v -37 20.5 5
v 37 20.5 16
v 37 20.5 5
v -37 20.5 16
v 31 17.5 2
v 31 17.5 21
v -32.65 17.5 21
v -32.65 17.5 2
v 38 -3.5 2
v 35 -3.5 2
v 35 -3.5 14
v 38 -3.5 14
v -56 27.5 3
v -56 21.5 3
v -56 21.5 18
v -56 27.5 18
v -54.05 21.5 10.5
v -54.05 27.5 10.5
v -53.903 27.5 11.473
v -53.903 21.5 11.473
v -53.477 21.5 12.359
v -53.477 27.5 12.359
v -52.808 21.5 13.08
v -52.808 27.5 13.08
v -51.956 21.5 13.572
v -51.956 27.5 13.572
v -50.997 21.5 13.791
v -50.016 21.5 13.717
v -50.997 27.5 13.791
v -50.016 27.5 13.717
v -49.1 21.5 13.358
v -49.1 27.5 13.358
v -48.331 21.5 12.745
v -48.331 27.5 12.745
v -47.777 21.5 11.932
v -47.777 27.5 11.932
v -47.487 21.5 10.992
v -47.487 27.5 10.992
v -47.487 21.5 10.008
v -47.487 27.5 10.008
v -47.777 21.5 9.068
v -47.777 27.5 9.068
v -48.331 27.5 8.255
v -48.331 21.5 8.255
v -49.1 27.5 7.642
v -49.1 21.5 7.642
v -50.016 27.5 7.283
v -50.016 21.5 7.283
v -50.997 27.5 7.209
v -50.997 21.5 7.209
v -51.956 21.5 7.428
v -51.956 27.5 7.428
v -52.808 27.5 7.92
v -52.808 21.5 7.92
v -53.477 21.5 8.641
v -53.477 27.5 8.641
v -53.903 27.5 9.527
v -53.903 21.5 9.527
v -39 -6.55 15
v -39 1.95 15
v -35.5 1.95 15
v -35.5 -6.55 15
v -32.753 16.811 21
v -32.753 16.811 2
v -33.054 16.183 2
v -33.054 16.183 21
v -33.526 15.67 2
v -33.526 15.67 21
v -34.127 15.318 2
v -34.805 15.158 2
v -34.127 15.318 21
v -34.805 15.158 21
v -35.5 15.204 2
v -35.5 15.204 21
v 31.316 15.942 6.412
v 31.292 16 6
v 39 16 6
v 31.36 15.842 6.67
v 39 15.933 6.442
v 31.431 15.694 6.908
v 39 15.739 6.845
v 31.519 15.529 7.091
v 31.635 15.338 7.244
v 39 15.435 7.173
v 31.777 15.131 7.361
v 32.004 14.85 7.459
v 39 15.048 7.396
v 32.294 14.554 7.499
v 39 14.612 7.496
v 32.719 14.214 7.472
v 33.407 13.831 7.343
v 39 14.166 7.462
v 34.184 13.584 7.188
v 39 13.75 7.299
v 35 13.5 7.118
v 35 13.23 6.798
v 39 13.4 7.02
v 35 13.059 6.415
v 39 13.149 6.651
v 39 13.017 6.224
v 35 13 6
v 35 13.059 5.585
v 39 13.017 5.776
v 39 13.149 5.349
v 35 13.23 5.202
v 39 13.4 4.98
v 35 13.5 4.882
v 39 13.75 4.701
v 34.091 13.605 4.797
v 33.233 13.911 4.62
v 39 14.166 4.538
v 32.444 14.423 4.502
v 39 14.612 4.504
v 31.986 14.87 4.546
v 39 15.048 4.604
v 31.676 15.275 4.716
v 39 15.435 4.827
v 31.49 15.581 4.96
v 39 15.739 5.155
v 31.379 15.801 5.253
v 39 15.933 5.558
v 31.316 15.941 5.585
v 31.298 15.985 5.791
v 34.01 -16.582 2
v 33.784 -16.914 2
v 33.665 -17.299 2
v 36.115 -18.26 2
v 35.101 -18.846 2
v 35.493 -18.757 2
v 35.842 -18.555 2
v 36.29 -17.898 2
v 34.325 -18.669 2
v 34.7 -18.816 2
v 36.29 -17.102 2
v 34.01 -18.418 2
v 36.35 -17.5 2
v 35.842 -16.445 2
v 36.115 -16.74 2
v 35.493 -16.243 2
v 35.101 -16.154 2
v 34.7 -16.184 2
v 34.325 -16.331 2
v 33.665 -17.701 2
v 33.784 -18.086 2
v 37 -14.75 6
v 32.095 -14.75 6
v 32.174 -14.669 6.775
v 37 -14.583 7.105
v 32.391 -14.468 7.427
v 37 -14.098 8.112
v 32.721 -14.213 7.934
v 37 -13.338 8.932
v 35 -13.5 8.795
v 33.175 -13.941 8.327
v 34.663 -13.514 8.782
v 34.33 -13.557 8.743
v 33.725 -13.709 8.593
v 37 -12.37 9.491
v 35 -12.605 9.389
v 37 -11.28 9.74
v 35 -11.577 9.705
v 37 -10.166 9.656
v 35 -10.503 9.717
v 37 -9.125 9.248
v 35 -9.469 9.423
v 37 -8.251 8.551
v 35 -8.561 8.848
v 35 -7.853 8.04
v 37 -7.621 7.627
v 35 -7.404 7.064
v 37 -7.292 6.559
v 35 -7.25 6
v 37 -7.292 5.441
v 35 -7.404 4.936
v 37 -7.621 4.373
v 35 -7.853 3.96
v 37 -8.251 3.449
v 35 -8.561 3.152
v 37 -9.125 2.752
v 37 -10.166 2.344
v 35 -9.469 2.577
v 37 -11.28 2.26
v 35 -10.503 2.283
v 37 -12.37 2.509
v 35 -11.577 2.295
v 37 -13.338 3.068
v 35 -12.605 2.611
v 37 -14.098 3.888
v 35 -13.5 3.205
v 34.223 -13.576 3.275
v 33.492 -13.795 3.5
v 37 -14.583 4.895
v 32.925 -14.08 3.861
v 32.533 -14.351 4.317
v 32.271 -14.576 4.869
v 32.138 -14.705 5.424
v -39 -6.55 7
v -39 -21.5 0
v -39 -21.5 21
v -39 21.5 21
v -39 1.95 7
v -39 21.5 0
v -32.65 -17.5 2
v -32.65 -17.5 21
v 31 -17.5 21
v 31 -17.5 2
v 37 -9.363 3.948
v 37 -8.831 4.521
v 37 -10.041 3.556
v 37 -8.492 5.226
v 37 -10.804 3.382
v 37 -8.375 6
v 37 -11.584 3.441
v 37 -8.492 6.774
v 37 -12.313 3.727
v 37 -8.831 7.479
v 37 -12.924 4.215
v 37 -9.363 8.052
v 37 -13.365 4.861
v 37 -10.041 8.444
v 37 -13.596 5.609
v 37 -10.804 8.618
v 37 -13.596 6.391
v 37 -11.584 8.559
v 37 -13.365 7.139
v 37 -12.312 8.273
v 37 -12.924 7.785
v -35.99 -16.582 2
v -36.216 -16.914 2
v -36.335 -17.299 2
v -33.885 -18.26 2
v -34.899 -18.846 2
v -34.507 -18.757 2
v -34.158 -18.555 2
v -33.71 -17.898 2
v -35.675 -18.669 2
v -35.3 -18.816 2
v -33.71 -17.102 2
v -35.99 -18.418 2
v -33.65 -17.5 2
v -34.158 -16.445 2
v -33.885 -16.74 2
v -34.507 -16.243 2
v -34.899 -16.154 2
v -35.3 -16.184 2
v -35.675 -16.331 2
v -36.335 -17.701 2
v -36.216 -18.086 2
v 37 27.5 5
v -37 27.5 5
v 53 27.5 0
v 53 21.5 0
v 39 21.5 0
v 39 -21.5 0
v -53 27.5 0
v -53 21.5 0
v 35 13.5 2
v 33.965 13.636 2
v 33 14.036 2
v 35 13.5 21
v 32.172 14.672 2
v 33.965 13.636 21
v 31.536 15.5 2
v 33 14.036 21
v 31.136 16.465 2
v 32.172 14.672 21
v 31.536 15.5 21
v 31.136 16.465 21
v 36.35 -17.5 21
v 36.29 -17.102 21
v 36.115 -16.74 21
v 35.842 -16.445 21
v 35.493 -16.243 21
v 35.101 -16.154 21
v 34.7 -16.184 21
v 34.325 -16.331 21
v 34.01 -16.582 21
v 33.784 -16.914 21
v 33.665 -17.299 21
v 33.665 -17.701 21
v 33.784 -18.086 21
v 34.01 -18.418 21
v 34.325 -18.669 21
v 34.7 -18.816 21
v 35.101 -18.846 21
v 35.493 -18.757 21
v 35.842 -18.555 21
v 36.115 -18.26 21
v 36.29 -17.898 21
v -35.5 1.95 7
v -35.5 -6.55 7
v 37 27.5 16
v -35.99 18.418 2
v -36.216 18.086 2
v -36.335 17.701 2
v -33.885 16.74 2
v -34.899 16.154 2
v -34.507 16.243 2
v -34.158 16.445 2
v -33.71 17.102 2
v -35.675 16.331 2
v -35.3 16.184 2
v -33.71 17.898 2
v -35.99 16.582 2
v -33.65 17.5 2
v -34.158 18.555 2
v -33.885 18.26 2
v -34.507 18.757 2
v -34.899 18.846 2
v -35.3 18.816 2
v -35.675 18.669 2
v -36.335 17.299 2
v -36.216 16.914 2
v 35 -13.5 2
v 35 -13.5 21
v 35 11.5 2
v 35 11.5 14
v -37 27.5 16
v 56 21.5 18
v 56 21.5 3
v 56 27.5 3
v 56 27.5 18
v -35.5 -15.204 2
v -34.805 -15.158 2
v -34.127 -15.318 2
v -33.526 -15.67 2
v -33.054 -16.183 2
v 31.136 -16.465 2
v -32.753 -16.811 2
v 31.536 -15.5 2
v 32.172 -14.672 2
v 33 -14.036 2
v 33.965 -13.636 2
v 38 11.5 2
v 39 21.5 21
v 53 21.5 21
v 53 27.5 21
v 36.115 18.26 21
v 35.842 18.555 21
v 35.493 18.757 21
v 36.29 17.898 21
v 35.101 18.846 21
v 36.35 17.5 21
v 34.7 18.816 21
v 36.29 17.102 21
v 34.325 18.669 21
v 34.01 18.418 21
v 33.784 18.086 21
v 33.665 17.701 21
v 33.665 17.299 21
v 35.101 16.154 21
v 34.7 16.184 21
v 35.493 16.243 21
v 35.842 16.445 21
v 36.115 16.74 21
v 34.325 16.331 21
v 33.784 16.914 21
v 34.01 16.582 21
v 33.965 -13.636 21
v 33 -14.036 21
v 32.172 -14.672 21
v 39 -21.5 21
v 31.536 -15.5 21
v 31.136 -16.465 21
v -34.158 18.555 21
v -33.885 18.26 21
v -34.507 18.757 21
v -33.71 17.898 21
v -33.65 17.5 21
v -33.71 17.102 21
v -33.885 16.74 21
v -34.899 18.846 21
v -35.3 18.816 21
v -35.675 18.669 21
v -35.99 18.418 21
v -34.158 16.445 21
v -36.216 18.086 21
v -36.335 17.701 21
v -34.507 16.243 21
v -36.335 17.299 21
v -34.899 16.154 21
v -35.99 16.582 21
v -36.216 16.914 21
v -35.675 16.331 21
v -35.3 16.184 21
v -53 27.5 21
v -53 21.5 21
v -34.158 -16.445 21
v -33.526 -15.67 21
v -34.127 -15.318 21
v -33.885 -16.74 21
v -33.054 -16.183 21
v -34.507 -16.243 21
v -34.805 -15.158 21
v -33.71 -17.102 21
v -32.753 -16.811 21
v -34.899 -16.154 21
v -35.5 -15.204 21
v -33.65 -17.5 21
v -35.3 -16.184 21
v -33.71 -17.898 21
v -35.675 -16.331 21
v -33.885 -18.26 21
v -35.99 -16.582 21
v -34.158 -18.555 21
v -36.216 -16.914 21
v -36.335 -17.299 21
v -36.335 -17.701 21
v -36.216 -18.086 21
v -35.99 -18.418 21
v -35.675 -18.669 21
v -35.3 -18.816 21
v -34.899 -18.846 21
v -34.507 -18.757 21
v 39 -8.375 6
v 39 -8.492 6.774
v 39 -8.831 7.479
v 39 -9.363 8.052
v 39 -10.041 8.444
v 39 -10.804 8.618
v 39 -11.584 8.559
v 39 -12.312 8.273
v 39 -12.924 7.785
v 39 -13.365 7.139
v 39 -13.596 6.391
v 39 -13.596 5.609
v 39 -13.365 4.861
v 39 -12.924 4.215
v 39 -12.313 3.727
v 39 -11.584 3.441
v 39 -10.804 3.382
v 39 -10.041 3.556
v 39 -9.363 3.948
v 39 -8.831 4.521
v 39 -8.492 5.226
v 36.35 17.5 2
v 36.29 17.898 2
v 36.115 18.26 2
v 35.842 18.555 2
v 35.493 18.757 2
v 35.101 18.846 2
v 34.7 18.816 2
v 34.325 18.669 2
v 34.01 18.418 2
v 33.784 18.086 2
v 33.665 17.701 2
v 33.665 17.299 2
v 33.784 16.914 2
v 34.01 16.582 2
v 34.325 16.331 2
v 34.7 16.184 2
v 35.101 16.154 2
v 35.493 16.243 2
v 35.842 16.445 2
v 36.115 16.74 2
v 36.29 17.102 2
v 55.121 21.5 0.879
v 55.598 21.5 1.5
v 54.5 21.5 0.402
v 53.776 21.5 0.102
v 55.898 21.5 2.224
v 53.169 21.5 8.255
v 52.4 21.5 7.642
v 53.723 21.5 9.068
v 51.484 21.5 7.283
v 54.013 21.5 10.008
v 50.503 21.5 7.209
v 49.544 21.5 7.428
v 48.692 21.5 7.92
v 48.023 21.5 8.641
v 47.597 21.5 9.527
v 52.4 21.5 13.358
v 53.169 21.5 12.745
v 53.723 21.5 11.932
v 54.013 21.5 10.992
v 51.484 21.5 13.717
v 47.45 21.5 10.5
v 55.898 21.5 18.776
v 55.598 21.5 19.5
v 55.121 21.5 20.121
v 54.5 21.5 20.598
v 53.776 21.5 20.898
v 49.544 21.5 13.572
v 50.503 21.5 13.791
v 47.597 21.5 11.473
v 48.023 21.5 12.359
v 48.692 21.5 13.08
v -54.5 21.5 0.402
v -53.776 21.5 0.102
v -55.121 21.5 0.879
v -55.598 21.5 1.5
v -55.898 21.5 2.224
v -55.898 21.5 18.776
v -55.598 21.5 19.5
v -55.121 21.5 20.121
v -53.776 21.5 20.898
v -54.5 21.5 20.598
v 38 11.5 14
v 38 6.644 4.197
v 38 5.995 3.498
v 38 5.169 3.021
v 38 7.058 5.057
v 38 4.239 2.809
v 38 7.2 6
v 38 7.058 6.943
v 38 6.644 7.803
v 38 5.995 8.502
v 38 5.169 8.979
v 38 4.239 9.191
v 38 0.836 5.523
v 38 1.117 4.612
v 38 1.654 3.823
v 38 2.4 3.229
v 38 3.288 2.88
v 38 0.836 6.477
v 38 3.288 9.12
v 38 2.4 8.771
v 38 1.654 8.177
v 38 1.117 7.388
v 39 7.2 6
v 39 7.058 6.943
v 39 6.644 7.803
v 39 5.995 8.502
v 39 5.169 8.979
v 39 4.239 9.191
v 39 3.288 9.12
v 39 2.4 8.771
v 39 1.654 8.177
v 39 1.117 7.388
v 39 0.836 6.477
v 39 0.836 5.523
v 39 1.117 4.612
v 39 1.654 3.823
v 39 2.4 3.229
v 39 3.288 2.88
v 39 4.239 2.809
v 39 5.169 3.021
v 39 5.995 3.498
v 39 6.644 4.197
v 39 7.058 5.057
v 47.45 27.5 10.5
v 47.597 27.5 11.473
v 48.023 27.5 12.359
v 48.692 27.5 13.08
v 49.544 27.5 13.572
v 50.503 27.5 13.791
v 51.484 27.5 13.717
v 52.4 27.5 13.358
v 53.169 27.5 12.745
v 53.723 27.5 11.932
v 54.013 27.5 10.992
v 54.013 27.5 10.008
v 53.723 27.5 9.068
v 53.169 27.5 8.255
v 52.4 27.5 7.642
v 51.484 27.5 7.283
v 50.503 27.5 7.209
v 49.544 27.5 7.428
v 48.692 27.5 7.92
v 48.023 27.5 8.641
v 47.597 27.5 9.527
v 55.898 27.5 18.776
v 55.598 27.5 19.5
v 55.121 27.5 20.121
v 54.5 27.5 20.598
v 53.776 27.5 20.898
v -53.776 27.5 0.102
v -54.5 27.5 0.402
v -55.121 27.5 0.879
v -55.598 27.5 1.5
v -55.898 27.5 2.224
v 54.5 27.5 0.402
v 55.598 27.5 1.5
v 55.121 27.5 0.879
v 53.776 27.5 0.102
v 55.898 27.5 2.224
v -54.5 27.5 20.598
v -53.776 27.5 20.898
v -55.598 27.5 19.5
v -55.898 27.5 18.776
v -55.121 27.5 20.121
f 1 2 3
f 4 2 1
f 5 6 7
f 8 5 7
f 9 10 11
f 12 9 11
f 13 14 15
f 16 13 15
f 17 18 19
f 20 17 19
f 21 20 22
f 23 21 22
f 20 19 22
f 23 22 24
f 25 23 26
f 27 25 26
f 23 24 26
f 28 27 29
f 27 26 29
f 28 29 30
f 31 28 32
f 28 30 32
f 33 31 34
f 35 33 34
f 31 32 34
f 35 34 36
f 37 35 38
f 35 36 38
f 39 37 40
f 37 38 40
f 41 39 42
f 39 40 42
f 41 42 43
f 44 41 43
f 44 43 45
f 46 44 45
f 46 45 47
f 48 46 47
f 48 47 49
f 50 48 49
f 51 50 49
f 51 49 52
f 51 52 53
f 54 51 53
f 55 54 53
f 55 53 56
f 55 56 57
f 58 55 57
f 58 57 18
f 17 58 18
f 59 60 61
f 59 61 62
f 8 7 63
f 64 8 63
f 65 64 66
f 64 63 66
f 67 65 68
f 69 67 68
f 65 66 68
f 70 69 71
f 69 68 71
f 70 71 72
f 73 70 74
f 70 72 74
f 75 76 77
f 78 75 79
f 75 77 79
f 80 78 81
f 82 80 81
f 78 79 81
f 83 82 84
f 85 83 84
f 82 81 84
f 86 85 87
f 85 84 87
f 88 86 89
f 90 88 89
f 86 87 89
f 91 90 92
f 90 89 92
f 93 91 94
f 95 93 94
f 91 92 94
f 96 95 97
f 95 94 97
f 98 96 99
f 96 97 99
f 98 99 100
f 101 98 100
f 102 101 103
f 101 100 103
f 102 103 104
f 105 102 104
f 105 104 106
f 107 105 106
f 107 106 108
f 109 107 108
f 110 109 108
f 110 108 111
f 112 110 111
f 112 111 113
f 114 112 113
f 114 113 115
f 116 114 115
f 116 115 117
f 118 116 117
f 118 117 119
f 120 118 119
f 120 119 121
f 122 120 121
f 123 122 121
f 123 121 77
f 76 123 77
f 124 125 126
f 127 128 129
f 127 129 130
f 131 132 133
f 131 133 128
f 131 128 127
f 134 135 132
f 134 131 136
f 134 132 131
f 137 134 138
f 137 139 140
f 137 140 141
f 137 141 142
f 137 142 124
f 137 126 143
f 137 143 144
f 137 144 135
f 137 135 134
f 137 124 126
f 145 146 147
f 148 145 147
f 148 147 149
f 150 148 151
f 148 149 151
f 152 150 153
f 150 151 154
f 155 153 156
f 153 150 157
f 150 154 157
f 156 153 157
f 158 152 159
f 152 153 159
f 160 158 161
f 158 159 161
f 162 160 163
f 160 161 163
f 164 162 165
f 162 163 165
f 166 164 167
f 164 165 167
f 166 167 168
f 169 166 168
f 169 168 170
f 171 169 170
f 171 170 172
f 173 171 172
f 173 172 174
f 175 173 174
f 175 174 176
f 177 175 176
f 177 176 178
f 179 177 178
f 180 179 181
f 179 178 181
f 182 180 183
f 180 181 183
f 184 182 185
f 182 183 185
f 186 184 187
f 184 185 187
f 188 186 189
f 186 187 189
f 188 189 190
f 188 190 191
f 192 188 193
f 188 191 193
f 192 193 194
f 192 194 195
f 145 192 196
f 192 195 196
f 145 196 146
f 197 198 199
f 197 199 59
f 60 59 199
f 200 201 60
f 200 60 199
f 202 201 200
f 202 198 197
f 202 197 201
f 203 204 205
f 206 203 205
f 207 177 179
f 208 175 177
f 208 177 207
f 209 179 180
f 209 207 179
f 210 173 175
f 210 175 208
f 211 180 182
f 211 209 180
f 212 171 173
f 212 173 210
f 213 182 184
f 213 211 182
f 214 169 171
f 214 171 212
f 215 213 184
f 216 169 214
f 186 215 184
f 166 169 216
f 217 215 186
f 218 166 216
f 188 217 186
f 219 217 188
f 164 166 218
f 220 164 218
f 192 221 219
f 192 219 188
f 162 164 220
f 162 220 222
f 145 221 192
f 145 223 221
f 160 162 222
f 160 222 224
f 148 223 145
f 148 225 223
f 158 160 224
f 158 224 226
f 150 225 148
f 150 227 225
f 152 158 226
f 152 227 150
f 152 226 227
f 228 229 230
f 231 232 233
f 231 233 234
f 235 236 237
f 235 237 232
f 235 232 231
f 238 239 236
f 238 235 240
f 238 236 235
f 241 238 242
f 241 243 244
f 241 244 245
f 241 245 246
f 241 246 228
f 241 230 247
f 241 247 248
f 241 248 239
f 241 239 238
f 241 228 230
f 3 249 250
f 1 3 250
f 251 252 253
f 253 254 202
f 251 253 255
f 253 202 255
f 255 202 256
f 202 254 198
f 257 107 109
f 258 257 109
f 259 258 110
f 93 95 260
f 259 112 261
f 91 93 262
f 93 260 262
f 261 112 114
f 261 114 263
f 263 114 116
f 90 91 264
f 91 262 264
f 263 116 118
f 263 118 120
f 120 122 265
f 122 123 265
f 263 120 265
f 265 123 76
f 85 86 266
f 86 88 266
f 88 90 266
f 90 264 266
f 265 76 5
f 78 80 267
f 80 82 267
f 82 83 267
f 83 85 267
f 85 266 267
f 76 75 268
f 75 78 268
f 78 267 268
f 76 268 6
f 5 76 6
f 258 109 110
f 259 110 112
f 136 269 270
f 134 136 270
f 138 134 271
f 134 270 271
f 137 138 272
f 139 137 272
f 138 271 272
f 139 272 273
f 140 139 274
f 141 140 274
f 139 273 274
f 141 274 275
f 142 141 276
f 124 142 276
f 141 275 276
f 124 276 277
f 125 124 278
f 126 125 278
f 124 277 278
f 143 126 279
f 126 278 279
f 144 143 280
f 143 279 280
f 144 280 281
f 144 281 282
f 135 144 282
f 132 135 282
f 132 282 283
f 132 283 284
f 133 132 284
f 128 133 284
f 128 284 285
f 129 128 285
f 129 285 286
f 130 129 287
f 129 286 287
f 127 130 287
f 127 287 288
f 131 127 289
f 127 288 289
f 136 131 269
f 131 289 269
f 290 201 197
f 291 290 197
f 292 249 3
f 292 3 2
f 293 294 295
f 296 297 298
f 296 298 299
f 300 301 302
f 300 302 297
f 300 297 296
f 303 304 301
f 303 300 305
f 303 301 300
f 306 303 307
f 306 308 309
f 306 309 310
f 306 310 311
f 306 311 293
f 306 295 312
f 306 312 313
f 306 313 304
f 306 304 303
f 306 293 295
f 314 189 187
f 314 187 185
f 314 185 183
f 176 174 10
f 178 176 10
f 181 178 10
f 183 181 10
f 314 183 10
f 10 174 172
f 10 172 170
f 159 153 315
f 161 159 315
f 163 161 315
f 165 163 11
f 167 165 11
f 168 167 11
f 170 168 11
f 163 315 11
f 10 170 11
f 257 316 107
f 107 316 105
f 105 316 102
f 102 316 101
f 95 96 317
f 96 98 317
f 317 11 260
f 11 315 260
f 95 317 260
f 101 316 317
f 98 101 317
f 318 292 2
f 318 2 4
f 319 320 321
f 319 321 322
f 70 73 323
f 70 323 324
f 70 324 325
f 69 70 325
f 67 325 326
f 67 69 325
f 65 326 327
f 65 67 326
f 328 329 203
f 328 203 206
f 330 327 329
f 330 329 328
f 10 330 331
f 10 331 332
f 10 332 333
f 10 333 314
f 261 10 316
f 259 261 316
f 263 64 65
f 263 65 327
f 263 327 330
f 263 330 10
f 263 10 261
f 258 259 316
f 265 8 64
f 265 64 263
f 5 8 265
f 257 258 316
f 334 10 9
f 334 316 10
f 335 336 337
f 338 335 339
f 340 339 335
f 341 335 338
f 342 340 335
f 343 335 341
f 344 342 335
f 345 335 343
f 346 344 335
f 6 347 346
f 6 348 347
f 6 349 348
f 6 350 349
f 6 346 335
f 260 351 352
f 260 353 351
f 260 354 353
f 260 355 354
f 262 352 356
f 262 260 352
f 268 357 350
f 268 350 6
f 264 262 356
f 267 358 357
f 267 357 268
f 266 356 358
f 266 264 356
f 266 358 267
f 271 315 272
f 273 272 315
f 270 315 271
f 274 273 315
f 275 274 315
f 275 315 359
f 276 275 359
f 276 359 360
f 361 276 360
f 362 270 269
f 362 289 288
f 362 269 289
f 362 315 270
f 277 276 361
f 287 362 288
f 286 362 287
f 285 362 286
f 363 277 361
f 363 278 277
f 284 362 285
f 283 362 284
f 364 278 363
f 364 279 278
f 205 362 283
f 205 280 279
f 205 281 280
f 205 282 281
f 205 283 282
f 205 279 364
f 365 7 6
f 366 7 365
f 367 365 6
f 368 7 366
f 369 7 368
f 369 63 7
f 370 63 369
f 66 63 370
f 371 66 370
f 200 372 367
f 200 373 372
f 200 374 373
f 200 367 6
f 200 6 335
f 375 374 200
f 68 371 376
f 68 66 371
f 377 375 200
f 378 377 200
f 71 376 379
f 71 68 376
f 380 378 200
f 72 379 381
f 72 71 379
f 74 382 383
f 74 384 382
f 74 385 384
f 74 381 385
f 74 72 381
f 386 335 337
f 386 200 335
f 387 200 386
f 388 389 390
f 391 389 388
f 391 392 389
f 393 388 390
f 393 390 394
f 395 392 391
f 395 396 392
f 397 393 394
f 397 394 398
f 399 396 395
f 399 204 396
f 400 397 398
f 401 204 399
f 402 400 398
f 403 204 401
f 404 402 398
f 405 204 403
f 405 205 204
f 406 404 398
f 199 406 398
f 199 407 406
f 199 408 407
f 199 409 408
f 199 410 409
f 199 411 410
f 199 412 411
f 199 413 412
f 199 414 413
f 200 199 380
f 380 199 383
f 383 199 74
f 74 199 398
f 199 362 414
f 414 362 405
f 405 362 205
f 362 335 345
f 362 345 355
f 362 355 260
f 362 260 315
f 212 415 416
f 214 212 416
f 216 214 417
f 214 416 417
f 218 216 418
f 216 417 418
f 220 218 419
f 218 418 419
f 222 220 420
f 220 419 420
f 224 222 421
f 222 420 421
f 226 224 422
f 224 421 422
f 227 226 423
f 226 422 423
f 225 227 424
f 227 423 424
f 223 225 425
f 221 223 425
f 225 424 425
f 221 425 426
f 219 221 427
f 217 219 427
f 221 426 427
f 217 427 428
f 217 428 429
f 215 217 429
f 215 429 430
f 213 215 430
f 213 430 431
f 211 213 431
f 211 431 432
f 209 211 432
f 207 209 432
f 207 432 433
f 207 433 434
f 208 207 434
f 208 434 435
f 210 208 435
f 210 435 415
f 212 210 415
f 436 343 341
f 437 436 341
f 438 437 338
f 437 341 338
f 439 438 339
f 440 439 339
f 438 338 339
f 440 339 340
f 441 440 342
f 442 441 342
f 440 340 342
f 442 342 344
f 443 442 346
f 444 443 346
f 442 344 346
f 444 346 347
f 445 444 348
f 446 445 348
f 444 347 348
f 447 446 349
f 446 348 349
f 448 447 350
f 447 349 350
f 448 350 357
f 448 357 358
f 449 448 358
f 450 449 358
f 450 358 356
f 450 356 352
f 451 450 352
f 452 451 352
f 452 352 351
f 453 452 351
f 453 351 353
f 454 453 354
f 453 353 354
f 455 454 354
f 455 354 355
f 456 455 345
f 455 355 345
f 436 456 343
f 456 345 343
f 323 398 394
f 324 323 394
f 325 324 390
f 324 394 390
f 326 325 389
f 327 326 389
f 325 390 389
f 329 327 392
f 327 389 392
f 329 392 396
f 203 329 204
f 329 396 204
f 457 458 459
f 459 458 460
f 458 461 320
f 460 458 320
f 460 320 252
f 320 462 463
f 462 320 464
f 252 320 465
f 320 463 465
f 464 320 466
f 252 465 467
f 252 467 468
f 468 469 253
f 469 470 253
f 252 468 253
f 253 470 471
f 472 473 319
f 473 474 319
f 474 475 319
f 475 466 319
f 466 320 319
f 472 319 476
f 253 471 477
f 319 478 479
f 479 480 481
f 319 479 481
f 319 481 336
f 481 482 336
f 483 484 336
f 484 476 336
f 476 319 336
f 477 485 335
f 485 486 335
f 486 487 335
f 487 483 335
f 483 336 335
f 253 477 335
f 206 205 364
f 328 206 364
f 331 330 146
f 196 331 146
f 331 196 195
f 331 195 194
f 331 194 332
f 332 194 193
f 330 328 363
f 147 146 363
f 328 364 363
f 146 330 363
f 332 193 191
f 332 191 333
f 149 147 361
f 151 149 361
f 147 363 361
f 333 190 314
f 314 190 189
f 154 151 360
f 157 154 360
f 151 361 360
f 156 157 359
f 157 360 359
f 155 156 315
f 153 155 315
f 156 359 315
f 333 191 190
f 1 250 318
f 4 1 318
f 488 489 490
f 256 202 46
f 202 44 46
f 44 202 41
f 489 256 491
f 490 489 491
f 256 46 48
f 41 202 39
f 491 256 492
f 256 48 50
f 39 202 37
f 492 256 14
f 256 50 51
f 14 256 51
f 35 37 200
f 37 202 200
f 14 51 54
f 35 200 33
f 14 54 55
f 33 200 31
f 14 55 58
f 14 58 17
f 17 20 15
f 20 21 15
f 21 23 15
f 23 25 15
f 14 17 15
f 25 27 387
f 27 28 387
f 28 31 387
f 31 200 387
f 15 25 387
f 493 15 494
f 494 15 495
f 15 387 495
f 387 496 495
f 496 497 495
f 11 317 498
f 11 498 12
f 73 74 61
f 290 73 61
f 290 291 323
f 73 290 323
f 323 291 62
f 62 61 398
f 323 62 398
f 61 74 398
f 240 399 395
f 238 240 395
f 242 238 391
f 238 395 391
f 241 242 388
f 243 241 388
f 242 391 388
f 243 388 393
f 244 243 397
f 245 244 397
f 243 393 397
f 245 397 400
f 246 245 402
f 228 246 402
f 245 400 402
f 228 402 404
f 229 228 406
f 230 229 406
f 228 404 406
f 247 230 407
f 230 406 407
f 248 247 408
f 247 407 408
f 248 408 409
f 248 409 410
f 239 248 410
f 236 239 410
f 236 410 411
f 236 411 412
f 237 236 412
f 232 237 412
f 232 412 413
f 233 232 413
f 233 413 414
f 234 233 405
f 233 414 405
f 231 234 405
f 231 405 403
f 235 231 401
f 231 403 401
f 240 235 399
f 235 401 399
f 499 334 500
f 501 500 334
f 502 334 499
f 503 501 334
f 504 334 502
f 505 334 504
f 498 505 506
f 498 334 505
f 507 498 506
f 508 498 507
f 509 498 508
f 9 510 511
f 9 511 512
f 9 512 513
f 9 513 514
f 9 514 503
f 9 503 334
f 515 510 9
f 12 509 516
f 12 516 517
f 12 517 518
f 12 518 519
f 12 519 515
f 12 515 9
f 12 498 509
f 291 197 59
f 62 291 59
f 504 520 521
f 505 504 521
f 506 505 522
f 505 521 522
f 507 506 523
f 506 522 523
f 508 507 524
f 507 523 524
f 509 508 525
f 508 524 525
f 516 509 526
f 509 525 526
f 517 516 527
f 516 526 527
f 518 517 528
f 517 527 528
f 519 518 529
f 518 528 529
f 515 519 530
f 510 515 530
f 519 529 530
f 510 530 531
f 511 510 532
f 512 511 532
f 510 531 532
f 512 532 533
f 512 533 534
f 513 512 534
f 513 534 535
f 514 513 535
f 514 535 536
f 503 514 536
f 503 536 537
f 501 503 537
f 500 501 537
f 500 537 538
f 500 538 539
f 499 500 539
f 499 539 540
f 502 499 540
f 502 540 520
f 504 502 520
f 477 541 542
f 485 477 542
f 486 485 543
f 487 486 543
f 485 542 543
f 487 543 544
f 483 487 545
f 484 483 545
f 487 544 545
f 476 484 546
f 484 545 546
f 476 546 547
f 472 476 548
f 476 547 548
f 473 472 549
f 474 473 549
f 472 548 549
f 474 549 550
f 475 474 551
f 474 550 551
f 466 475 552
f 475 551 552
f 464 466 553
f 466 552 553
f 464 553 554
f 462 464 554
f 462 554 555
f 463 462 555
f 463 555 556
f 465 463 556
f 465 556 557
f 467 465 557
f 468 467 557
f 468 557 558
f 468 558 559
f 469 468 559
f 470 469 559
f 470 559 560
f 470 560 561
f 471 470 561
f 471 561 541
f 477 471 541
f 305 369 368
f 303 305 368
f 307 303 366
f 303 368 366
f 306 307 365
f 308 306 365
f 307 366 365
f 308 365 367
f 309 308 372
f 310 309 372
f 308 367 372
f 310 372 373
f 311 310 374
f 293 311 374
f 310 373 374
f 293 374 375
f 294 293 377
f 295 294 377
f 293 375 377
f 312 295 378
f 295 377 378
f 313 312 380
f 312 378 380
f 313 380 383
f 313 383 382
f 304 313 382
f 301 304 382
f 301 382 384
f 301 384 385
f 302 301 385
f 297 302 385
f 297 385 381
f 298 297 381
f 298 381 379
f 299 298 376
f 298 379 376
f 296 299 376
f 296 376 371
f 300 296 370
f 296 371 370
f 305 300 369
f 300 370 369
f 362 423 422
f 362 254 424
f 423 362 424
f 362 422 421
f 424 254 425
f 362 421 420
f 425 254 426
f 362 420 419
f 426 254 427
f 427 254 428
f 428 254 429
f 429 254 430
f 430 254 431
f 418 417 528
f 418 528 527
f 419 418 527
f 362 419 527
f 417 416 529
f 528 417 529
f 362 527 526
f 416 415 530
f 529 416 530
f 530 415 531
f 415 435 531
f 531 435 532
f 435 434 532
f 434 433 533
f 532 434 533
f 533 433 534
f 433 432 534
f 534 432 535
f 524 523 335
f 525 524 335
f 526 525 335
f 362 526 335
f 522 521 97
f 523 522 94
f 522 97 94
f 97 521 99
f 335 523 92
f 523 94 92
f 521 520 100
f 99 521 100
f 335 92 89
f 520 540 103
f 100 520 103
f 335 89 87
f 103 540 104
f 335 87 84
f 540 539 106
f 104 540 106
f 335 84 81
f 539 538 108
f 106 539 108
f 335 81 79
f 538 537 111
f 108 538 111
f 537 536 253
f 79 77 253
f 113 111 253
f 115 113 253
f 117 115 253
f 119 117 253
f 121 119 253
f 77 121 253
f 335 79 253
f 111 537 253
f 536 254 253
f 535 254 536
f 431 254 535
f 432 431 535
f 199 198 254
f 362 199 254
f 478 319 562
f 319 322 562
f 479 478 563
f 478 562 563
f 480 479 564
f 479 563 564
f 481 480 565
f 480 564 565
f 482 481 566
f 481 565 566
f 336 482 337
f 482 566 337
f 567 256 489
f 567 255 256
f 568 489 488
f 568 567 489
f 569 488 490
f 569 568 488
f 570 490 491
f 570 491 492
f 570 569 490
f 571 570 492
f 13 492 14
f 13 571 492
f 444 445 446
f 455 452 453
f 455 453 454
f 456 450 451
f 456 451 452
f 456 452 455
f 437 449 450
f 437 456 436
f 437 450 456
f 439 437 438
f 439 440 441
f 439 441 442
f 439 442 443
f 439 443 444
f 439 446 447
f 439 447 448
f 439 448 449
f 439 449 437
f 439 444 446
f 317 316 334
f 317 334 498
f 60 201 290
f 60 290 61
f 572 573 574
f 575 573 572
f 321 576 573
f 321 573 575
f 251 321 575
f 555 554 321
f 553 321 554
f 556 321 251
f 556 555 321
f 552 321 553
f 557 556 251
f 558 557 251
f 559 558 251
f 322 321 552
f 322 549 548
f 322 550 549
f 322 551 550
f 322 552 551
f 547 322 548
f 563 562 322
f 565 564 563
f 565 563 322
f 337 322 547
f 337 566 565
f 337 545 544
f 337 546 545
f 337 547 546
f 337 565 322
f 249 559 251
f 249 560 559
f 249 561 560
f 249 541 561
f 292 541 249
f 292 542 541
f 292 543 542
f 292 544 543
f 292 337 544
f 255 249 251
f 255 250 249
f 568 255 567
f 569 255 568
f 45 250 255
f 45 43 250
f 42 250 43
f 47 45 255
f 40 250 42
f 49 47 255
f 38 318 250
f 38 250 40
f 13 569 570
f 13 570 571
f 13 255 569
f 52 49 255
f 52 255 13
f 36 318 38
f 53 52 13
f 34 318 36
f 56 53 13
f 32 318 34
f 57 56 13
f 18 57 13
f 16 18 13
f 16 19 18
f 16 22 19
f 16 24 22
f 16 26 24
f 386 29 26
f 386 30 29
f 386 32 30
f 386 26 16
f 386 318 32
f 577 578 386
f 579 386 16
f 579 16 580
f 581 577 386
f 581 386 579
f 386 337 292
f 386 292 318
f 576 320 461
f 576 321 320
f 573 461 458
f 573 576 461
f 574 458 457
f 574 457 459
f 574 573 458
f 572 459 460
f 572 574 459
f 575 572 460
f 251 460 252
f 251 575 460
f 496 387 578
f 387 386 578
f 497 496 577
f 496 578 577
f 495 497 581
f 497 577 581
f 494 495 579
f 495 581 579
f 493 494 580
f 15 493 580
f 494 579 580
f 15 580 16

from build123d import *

# Parameters (mm, degrees)
F0_W      = 78
F0_H      = 43
F1_DEPTH  = 21
F2_R      = 1.35
F3_DEPTH  = 19
F5_DEPTH  = 19
F7_R      = 3.2
F7_R_2    = 1.5
F7_R_3    = 2.625
F8_DEPTH  = 10
F9_W      = 112
F9_H      = 21
F10_DEPTH = 6
F11_R     = 3.3
F12_DEPTH = 49.001
F13_R     = 3
F14_W     = 15
F14_H     = 12
F15_DEPTH = 3
F16_W     = 74
F16_H     = 11
F17_DEPTH = 7
F19_R     = 3.75
F20_DEPTH = 7
F22_W     = 8.5
F22_H     = 8
F23_DEPTH = 3.5


with BuildPart() as f1:
    # F0 (on Top) → F1 (new body)
    with BuildSketch(Plane.XY):
        Rectangle(F0_W, F0_H)
    extrude(amount=F1_DEPTH)

    # F2 (on face) → F3 (cut)
    with BuildSketch(Plane.XY.offset(21)):
        with BuildLine():
            Line((31, 17.5), (-31, 17.5))
            Line((-31, 17.5), (-31, -17.5))
            Line((-31, -17.5), (31, -17.5))
            ThreePointArc((31, -17.5), (32.1715728753, -14.6715728753), (35, -13.5))
            Line((35, -13.5), (35, 13.5))
            ThreePointArc((35, 13.5), (32.1715728753, 14.6715728753), (31, 17.5))
        make_face()
        with Locations((-35, 17.5)):
            Circle(F2_R)
        with Locations((35, 17.5)):
            Circle(F2_R)
        with Locations((-35, -17.5)):
            Circle(F2_R)
        with Locations((35, -17.5)):
            Circle(F2_R)
    extrude(amount=-F3_DEPTH, mode=Mode.SUBTRACT)

    # F4 (on face) → F5 (cut)
    with BuildSketch(Plane.XY.offset(21)):
        with BuildLine():
            ThreePointArc((-32.65, 17.5), (-33.5256357302, 15.6700409841), (-35.5, 15.2038074994))
            Line((-35.5, 15.2038074994), (-35.5, -15.2038074994))
            ThreePointArc((-35.5, -15.2038074994), (-33.5256357302, -15.6700409841), (-32.65, -17.5))
            Line((-32.65, -17.5), (-31, -17.5))
            Line((-31, -17.5), (-31, 17.5))
            Line((-31, 17.5), (-32.65, 17.5))
        make_face()
    extrude(amount=-F5_DEPTH, mode=Mode.SUBTRACT)

    # F7 (on face) → F8 (cut)
    with BuildSketch(Plane.YZ.offset(39)):
        with Locations((4, 6)):
            Circle(F7_R)
        with Locations((14.5, 6)):
            Circle(F7_R_2)
        with Locations((-11, 6)):
            Circle(F7_R_3)
    extrude(amount=-F8_DEPTH, mode=Mode.SUBTRACT)

    # F9 (on face) → F10 (join)
    with BuildSketch(Plane(origin=(0, 21.5, 0), x_dir=(-1, 0, 0), z_dir=(0, 1, 0))):
        with Locations((0, 10.5)):
            Rectangle(F9_W, F9_H)
    extrude(amount=F10_DEPTH)

    # F11 (on face) → F12 (cut, through all)
    with BuildSketch(Plane(origin=(0, 27.5, 0), x_dir=(-1, 0, 0), z_dir=(0, 1, 0))):
        with Locations((50.75, 10.5)):
            Circle(F11_R)
        with Locations((-50.75, 10.5)):
            Circle(F11_R)
    extrude(amount=-F12_DEPTH, mode=Mode.SUBTRACT)

    # F13
    f13_edges = [f1.edges().sort_by_distance(p)[0] for p in [
        (56, 24.5, 21),
        (56, 24.5, 0),
        (-56, 24.5, 0),
        (-56, 24.5, 21),
    ]]
    fillet(f13_edges, radius=F13_R)

    # F14 (on face) → F15 (cut)
    with BuildSketch(Plane(origin=(35, 0, 0), x_dir=(0, -1, 0), z_dir=(-1, 0, 0))):
        with Locations((-4, 8)):
            Rectangle(F14_W, F14_H)
    extrude(amount=-F15_DEPTH, mode=Mode.SUBTRACT)

    # F16 (on face) → F17 (cut)
    with BuildSketch(Plane(origin=(0, 27.5, 0), x_dir=(-1, 0, 0), z_dir=(0, 1, 0))):
        with Locations((0, 10.5)):
            Rectangle(F16_W, F16_H)
    extrude(amount=-F17_DEPTH, mode=Mode.SUBTRACT)

    # F19 (on offset) → F20 (cut)
    with BuildSketch(Plane(origin=(30, 0, 0), x_dir=(0, -1, 0), z_dir=(-1, 0, 0))):
        with Locations((11, 6)):
            Circle(F19_R)
    extrude(amount=-F20_DEPTH, mode=Mode.SUBTRACT)

    # F22 (on face) → F23 (cut, through all)
    with BuildSketch(Plane(origin=(-39, 0, 0), x_dir=(0, -1, 0), z_dir=(-1, 0, 0))):
        with Locations((2.3, 11)):
            Rectangle(F22_W, F22_H)
    extrude(amount=-F23_DEPTH, mode=Mode.SUBTRACT)


solid = f1.part
